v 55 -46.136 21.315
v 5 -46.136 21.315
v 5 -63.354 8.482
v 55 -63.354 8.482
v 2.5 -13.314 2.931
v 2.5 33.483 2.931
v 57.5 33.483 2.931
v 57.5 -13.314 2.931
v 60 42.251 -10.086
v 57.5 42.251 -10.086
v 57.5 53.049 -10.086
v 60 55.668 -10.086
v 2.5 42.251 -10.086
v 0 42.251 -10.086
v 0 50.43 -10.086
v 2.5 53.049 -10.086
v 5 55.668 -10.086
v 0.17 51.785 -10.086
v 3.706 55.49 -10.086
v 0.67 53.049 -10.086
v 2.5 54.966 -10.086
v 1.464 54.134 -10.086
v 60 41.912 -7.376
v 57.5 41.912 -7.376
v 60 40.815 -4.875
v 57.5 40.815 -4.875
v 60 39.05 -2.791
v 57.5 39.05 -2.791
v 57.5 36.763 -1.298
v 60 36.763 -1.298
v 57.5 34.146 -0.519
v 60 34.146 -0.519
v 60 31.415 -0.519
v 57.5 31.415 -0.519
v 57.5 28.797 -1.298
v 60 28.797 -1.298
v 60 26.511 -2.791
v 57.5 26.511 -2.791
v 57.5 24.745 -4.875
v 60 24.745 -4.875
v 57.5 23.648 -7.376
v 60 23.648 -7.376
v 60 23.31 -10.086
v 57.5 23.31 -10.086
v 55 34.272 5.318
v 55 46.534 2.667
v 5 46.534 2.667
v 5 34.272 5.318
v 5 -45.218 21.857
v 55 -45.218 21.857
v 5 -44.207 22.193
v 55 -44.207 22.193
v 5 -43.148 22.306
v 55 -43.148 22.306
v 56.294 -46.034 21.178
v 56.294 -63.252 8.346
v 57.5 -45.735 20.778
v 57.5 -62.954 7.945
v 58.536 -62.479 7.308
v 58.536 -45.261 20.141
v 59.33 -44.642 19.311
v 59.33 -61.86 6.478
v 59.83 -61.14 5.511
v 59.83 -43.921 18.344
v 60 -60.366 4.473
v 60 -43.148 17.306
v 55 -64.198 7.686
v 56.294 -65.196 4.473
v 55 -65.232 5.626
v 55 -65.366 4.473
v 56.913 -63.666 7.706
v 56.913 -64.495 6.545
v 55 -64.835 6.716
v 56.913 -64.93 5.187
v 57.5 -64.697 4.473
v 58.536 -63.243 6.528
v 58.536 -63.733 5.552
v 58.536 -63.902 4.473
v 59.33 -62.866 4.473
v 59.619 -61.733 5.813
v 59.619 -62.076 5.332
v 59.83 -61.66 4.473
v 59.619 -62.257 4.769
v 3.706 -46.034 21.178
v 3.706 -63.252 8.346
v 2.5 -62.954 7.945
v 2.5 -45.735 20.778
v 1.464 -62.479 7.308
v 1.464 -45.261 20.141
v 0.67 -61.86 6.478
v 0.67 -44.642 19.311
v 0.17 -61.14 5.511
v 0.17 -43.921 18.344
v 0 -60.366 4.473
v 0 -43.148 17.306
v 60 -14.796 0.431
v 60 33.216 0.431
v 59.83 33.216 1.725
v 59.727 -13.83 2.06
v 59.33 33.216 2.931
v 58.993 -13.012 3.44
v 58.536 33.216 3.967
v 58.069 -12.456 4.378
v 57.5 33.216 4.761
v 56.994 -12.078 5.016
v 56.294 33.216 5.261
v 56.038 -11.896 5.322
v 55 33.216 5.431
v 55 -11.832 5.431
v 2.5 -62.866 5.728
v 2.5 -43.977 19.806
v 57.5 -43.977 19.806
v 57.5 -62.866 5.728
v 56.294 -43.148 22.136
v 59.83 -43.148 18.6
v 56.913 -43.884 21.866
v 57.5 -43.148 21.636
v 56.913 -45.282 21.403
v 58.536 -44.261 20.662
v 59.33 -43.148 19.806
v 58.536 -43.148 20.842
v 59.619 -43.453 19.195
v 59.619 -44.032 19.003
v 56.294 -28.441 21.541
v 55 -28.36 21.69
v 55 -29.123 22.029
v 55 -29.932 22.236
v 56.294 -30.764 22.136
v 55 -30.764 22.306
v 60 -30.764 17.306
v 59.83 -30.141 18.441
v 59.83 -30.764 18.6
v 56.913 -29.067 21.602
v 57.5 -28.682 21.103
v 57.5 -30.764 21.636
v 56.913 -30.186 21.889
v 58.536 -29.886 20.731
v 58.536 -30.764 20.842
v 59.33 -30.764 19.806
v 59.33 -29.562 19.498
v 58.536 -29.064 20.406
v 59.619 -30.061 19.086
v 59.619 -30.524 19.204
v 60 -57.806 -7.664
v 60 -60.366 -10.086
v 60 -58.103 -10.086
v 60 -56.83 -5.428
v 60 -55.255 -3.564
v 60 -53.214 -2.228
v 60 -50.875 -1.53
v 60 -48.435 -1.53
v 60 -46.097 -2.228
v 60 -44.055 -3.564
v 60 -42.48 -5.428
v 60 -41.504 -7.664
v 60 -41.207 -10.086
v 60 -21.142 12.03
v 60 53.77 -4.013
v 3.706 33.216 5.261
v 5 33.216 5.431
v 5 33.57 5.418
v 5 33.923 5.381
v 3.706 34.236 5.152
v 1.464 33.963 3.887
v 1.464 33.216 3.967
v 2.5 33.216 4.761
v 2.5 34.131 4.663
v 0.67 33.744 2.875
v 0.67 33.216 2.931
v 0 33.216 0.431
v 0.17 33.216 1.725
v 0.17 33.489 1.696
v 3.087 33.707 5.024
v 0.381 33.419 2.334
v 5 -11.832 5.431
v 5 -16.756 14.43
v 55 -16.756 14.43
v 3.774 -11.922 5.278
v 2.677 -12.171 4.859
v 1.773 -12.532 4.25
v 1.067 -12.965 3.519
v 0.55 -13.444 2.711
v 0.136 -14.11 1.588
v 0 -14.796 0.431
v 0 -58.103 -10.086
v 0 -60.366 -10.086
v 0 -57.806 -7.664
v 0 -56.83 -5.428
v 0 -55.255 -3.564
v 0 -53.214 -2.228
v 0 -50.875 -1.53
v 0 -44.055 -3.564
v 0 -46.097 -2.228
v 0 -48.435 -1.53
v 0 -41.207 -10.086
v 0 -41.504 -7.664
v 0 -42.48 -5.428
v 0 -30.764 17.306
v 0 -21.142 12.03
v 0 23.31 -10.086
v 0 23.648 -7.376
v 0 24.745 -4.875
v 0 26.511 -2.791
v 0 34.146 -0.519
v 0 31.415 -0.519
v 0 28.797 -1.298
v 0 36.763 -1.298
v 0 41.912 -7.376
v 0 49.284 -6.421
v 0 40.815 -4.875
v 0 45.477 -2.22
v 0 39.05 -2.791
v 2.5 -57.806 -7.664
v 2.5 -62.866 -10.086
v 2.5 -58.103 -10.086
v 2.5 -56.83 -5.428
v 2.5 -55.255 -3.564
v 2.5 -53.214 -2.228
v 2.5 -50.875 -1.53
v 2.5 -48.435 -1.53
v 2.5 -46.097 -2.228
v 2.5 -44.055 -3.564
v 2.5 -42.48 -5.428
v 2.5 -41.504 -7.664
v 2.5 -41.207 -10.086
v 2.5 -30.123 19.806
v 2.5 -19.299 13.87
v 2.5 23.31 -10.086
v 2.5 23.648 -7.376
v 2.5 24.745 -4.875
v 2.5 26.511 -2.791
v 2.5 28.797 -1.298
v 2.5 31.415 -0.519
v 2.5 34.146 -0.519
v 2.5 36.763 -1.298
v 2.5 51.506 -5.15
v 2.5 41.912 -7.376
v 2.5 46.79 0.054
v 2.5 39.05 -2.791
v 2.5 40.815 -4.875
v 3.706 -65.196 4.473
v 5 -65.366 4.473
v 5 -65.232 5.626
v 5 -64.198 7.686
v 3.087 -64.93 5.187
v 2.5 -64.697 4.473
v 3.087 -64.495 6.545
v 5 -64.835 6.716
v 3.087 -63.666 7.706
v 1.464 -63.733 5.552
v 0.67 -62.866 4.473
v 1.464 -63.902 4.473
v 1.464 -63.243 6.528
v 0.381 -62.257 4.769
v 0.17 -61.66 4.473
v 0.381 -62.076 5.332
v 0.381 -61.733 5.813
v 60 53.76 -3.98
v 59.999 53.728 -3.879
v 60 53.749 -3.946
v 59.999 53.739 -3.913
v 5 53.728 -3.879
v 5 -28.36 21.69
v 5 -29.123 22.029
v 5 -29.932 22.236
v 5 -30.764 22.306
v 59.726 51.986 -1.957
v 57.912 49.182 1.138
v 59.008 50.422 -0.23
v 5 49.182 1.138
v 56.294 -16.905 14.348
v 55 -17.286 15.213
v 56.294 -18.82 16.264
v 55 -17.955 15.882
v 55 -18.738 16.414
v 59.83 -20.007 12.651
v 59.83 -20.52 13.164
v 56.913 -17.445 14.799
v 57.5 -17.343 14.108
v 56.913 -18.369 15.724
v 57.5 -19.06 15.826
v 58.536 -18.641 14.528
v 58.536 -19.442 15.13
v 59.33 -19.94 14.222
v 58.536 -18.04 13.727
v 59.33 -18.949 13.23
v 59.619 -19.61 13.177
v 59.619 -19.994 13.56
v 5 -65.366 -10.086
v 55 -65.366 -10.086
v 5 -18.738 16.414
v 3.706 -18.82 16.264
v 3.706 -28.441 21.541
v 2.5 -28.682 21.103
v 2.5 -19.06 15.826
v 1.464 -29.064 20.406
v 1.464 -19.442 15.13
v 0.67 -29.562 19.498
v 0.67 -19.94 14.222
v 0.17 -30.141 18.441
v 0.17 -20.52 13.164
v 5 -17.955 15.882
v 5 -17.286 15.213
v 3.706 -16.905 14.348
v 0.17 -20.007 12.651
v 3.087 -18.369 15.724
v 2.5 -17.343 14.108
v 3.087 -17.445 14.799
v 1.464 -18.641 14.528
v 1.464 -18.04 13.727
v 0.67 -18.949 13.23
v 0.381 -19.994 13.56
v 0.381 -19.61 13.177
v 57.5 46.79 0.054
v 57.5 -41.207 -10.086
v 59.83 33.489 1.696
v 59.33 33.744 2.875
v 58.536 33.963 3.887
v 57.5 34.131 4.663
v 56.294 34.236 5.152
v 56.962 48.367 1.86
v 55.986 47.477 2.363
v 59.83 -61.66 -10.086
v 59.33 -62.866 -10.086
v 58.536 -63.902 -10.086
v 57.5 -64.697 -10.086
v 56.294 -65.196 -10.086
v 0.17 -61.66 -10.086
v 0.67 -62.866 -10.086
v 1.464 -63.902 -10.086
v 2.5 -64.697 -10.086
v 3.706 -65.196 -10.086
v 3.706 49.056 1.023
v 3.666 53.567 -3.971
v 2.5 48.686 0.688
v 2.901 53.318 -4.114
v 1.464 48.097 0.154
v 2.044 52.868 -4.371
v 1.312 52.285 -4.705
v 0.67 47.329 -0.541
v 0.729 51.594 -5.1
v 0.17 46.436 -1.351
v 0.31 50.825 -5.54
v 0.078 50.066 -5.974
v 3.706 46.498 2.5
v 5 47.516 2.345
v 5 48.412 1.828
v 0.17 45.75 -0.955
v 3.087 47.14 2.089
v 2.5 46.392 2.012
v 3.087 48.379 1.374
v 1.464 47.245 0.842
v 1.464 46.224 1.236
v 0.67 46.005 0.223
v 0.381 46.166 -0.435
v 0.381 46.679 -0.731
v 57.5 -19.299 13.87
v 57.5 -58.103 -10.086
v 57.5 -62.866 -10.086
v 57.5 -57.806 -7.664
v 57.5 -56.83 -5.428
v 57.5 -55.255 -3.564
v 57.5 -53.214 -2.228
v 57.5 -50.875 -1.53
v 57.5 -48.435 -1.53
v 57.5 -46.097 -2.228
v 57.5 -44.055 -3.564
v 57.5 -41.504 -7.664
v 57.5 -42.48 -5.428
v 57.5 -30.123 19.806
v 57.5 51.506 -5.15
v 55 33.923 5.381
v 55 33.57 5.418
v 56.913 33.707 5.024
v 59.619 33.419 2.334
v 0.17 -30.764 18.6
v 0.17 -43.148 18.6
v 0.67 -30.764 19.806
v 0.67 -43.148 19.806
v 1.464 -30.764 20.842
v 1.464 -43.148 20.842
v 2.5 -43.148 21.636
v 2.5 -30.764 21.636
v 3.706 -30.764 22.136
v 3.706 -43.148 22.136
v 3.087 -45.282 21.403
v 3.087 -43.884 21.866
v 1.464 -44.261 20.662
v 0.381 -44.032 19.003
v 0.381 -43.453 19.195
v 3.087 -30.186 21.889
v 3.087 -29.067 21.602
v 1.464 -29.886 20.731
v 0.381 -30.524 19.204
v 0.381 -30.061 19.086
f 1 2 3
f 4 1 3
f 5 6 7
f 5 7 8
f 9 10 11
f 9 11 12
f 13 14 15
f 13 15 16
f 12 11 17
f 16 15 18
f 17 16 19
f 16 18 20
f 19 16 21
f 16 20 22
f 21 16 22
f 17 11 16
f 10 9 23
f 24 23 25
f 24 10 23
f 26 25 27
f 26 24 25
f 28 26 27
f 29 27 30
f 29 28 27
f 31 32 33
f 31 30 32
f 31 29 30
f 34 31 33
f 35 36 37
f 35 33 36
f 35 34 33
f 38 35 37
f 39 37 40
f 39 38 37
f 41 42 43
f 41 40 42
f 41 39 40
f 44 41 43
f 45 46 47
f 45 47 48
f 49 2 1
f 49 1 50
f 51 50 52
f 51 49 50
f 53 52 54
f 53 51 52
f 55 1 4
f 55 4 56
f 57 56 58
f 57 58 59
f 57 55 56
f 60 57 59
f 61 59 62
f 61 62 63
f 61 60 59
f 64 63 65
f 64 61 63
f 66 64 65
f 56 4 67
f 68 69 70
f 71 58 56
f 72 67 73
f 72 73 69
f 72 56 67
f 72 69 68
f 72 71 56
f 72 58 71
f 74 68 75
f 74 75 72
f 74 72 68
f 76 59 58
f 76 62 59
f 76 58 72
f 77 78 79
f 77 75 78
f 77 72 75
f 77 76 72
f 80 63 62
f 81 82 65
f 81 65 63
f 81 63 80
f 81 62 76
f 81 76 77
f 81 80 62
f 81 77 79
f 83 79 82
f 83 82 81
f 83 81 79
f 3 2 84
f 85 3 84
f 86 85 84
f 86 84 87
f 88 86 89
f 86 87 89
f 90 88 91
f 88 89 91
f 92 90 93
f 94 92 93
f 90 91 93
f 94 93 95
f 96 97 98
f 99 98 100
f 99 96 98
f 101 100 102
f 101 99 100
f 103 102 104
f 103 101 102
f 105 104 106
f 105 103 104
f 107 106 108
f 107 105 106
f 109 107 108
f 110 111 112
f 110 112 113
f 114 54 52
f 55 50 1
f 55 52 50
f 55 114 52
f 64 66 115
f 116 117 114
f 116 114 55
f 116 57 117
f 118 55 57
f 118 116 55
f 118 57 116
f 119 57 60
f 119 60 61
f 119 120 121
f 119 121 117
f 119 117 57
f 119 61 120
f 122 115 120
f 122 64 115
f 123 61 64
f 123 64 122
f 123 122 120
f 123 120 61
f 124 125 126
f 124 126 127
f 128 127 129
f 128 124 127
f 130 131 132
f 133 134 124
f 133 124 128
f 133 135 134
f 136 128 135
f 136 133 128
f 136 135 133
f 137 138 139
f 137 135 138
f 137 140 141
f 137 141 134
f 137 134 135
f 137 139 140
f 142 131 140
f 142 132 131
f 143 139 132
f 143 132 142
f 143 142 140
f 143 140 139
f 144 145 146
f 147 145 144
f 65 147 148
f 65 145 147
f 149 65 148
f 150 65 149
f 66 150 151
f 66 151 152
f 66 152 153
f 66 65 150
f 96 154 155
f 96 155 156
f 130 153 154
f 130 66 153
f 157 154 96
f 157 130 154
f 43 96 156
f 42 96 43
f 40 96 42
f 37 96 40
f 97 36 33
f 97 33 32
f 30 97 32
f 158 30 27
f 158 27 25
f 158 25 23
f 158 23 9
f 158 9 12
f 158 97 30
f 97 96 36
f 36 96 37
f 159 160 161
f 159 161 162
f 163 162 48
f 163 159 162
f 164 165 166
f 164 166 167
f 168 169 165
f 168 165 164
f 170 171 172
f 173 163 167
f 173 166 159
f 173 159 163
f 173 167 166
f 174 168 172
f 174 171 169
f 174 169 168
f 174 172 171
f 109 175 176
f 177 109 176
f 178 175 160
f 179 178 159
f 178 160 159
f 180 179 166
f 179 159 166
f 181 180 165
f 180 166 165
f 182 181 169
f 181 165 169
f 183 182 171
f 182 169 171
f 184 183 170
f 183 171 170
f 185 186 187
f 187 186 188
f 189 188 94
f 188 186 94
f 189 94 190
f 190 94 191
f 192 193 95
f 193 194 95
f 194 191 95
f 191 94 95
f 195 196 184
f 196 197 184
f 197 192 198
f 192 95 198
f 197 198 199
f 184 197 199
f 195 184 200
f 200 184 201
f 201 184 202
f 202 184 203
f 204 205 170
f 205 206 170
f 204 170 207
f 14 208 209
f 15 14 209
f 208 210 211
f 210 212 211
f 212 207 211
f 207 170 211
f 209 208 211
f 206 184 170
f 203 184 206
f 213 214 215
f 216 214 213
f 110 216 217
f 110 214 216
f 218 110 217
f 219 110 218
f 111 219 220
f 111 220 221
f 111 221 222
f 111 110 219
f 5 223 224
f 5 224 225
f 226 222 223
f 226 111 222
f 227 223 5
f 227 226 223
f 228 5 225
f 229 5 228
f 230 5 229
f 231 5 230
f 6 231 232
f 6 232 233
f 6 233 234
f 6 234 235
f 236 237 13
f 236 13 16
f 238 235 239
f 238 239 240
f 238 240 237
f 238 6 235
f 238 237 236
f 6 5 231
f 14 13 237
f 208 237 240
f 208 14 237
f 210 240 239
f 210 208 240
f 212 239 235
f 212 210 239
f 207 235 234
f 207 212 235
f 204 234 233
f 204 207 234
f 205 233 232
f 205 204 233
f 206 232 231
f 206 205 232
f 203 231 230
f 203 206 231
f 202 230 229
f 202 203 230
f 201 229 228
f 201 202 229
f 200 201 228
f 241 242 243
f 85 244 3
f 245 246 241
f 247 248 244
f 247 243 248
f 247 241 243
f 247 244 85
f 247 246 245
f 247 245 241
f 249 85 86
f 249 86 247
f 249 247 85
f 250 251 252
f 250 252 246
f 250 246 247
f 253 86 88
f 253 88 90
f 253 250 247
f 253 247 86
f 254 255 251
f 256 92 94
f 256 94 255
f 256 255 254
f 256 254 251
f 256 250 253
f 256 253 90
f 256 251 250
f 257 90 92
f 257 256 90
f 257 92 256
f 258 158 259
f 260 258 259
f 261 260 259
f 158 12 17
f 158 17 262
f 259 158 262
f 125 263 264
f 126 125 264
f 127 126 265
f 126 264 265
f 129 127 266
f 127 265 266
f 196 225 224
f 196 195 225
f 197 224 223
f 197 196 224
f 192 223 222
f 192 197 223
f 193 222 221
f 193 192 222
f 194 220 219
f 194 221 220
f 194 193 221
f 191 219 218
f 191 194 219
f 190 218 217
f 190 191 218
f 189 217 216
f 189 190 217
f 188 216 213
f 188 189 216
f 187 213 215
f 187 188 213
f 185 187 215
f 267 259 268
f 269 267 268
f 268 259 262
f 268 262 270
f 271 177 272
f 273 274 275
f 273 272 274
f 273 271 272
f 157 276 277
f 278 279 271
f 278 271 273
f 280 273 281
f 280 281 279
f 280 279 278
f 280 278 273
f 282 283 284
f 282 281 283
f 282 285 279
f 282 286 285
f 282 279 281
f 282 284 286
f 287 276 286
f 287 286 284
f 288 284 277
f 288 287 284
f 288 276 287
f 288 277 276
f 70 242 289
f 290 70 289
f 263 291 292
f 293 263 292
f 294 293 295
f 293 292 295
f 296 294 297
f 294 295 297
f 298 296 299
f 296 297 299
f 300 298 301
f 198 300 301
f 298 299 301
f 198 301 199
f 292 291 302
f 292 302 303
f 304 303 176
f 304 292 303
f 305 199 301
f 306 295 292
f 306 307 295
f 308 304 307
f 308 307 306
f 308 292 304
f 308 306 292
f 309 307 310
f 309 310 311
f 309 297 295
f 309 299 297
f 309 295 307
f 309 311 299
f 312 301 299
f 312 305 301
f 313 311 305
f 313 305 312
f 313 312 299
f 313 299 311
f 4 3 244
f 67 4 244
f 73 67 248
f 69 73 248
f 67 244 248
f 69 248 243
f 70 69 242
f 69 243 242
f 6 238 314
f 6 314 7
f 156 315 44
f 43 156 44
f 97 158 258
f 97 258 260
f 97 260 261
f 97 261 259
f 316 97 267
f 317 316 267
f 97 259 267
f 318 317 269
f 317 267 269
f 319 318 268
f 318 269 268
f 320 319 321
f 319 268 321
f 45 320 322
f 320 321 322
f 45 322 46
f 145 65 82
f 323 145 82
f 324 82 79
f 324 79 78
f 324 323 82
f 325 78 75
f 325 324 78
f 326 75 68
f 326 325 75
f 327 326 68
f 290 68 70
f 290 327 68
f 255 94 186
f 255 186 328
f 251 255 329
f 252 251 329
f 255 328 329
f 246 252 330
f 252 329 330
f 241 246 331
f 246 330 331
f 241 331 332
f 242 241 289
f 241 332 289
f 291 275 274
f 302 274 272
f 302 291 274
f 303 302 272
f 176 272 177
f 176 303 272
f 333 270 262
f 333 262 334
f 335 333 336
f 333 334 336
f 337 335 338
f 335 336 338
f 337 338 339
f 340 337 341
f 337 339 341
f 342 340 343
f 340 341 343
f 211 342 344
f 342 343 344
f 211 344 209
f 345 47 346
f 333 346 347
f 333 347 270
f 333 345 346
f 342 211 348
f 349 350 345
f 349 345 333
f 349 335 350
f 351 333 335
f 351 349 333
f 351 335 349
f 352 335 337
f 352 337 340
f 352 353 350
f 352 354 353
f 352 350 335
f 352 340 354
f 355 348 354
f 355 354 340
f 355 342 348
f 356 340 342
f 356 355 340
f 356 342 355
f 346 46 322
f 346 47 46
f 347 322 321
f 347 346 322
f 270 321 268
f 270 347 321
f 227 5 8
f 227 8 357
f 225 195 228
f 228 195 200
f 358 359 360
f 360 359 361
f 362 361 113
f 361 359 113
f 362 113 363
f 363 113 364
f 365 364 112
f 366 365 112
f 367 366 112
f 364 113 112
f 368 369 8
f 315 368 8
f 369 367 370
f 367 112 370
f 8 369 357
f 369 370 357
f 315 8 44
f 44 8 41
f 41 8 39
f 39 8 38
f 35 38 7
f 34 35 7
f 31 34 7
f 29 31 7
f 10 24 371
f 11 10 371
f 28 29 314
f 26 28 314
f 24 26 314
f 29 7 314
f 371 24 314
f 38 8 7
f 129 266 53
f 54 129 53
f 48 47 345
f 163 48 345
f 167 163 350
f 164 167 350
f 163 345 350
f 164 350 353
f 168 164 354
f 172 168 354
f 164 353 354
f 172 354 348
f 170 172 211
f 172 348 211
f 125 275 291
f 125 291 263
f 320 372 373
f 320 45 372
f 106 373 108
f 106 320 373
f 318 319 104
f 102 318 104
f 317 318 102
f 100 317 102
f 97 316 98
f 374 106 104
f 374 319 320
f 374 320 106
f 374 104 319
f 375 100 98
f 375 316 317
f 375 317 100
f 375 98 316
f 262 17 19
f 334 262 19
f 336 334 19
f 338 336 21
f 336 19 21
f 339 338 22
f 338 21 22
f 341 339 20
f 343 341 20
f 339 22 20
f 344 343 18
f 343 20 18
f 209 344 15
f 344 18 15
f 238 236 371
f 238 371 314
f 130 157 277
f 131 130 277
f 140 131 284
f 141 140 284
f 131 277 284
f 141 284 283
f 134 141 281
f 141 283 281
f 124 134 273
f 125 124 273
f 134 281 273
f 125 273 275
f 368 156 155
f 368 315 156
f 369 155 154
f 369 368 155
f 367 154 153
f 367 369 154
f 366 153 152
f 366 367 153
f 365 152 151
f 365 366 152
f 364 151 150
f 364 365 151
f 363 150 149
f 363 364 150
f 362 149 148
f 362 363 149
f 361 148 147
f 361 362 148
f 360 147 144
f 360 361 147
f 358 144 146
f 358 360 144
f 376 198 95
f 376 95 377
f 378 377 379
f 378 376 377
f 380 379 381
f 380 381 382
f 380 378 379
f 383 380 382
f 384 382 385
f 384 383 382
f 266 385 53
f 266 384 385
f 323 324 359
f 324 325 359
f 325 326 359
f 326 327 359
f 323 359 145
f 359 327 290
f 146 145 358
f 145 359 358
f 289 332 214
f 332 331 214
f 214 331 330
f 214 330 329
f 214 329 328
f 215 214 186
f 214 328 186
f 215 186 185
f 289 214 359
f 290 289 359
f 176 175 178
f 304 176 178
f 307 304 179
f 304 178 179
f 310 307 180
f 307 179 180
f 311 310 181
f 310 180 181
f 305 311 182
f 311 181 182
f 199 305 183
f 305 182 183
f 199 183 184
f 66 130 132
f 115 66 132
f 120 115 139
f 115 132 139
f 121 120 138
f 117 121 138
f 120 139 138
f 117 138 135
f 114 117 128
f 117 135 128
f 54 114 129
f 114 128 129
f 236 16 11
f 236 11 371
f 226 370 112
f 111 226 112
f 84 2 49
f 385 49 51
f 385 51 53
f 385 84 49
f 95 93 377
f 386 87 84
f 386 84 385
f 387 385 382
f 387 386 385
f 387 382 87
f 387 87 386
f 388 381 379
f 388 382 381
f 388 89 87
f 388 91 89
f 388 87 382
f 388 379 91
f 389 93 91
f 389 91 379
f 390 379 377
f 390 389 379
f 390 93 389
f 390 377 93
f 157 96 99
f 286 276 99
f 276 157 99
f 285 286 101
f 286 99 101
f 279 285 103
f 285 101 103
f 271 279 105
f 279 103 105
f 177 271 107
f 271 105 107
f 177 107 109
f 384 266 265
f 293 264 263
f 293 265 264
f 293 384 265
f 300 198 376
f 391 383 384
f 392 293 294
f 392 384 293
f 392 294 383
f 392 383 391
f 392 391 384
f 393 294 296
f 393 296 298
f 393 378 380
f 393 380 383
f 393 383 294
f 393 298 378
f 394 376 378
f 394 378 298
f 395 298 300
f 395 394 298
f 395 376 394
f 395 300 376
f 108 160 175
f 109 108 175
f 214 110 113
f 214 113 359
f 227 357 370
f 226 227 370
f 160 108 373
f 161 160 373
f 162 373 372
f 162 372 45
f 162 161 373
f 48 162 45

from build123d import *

# Parameters (mm, degrees)
F1_DEPTH      = 60
F2_T          = -2.5
F3_T1_DEPTH   = 31.5029107171
F3_T3_DEPTH   = 19.2704775269
F3_T5_DEPTH   = 59.0151251094
F3_T7_DEPTH   = 50
F3_T9_DEPTH   = 12.544705842
F3_T11_DEPTH  = 26.6507558857
F3_T13_DEPTH  = 10.9735782615
F3_T15_DEPTH  = 12.384029335
F3_T17_DEPTH  = 21.4746284083
F3_T19_DEPTH  = 27.0595039158
F3_T24_DEPTH  = 5
F3_T30_DEPTH  = 5
F3_T36_DEPTH  = 5
F3_T42_DEPTH  = 5
F3_T48_DEPTH  = 5
F3_T54_DEPTH  = 5
F3_T60_DEPTH  = 5
F3_T66_DEPTH  = 5
F3_T72_DEPTH  = 5
F3_T78_DEPTH  = 5
F3_T84_DEPTH  = 5
F3_T90_DEPTH  = 57.5475311177
F3_T95_DEPTH  = 22.7575976563
F3_T100_DEPTH = 57.5475311177
F3_T105_DEPTH = 22.7575976563
F3_T111_DEPTH = 22.7575976563
F3_T115_DEPTH = 57.5475311177
F3_T122_DEPTH = 57.5475311177
F3_T126_DEPTH = 22.7575976563
F4_R          = 8.968677233
F4_R_2        = 8.5168287605
F5_DEPTH      = 60
F6_R          = 9.472590991
F6_R_2        = 8.4503132789
F7_DEPTH      = 65.4


# Not quite as in the source:
# - a fillet or chamfer that OpenCascade refuses, or shapes differently, is made with other operations: its cross-section is extruded or revolved along the edge and cut away or added


with BuildPart() as f1:
    # F0 (on Right) → F1 (new body)
    with BuildSketch(Plane.YZ):
        Polygon((-44.8060370982, 22.3060343415), (-65.3663799167, 6.9827586412), (-65.3663799167, -10.0862076506), (55.6681081653, -10.0862076506), (53.7284500897, -3.8793103304), (48.1034480035, 2.3275862914), (33.7500013411, 5.4310346022), (20.5603465438, 5.4310346022), (4.4612074271, 5.4310346022), (-11.8318963796, 5.4310346022), (-17.4568966031, 15.7112069428), (-29.4827595353, 22.3060343415), align=None)
    extrude(amount=F1_DEPTH)

    # F2
    f2_openings = [f1.faces().sort_by_distance(p)[0] for p in [
        (30, -4.849136, -10.086208),
    ]]
    offset(amount=F2_T, openings=f2_openings, kind=Kind.INTERSECTION)

    # F3: fillet of radius 5 on 22 edges, made by hand

    # F3_s2 → F3_t1 (cut)
    with BuildSketch(Plane(origin=(0, 11.5526545627, -36.9684438457), x_dir=(1, 0, 0), z_dir=(0, -0.2982753662, 0.9544798614))):
        with BuildLine():
            ThreePointArc((5, 50.125620888), (1.4644660941, 48.661154794), (0, 45.125620888))
            Line((0, 45.125620888), (0, 50.125620888))
            Line((0, 50.125620888), (5, 50.125620888))
        make_face()
    extrude(amount=F3_T1_DEPTH, mode=Mode.SUBTRACT)

    # F3_s4 → F3_t3 (cut)
    with BuildSketch(Plane(origin=(0, 34.5525169769, -38.1269015747), x_dir=(1, 0, 0), z_dir=(0, -0.6715195573, 0.7409868313))):
        with BuildLine():
            ThreePointArc((5, 37.2070412259), (1.4644660941, 35.7425751318), (0, 32.2070412259))
            Line((0, 32.2070412259), (0, 37.2070412259))
            Line((0, 37.2070412259), (5, 37.2070412259))
        make_face()
    extrude(amount=F3_T3_DEPTH, mode=Mode.SUBTRACT)

    # F3_s6 → F3_t5 (cut)
    with BuildSketch(Plane.YZ.offset(5)):
        with BuildLine():
            ThreePointArc((46.533671949, 2.6669973721), (47.9776130651, 2.1097041201), (49.1819420179, 1.1375243586))
            Line((49.1819420179, 1.1375243586), (48.1034480035, 2.3275862914))
            Line((48.1034480035, 2.3275862914), (46.533671949, 2.6669973721))
        make_face()
    extrude(amount=F3_T5_DEPTH, mode=Mode.SUBTRACT)

    # F3_s8 → F3_t7 (cut)
    with BuildSketch(Plane.YZ.offset(5)):
        with BuildLine():
            ThreePointArc((33.2156347381, 5.4310346022), (33.7469754945, 5.4027221427), (34.2722988256, 5.3181054024))
            Line((34.2722988256, 5.3181054024), (33.7500013411, 5.4310346022))
            Line((33.7500013411, 5.4310346022), (33.2156347381, 5.4310346022))
        make_face()
        with BuildLine():
            ThreePointArc((-46.1356544501, 21.3150930211), (-44.7217318567, 22.051837403), (-43.147770834, 22.3060343415))
            Line((-43.147770834, 22.3060343415), (-44.8060370982, 22.3060343415))
            Line((-44.8060370982, 22.3060343415), (-46.1356544501, 21.3150930211))
        make_face()
        with BuildLine():
            ThreePointArc((-63.3542635327, 8.4823549449), (-64.8351279561, 6.7161272798), (-65.3663799167, 4.4732962652))
            Line((-65.3663799167, 4.4732962652), (-65.3663799167, 6.9827586412))
            Line((-65.3663799167, 6.9827586412), (-63.3542635327, 8.4823549449))
        make_face()
        with BuildLine():
            ThreePointArc((-28.3595786282, 21.6900964864), (-29.5228367333, 22.1496027948), (-30.763741499, 22.3060343415))
            Line((-30.763741499, 22.3060343415), (-29.4827595353, 22.3060343415))
            Line((-29.4827595353, 22.3060343415), (-28.3595786282, 21.6900964864))
        make_face()
        with BuildLine():
            ThreePointArc((-18.7378088181, 16.4136426032), (-17.604783068, 15.5634588744), (-16.7556605267, 14.4296376218))
            Line((-16.7556605267, 14.4296376218), (-17.4568966031, 15.7112069428))
            Line((-17.4568966031, 15.7112069428), (-18.7378088181, 16.4136426032))
        make_face()
    extrude(amount=F3_T7_DEPTH, mode=Mode.SUBTRACT)

    # F3_s10 → F3_t9 (cut)
    with BuildSketch(Plane(origin=(0, 43.9045114329, -9.492868511), x_dir=(1, 0, 0), z_dir=(0, -0.97741416, 0.2113328175))):
        with BuildLine():
            ThreePointArc((5, 12.4408529979), (1.4644660941, 10.9763869038), (0, 7.4408529979))
            Line((0, 7.4408529979), (0, 12.4408529979))
            Line((0, 12.4408529979), (5, 12.4408529979))
        make_face()
    extrude(amount=F3_T9_DEPTH, mode=Mode.SUBTRACT)

    # F3_s12 → F3_t11 (cut)
    with BuildSketch(Plane(origin=(0, 57.6919644879, -12.4739398105), x_dir=(1, 0, 0), z_dir=(0, -0.97741416, 0.2113328175))):
        with BuildLine():
            ThreePointArc((60, 7.4408529979), (58.5355339059, 10.9763869038), (55, 12.4408529979))
            Line((55, 12.4408529979), (60, 12.4408529979))
            Line((60, 12.4408529979), (60, 7.4408529979))
        make_face()
    extrude(amount=F3_T11_DEPTH, mode=Mode.SUBTRACT)

    # F3_s14 → F3_t13 (cut)
    with BuildSketch(Plane(origin=(0, -21.3256194356, 11.6946933572), x_dir=(1, 0, 0), z_dir=(0, -0.876812429, 0.4808325742))):
        with BuildLine():
            ThreePointArc((5, 5.3819369913), (1.4644660941, 3.9174708973), (0, 0.3819369913))
            Line((0, 0.3819369913), (0, 5.3819369913))
            Line((0, 5.3819369913), (5, 5.3819369913))
        make_face()
        with BuildLine():
            ThreePointArc((60, 0.3819369913), (58.5355339059, 3.9174708973), (55, 5.3819369913))
            Line((55, 5.3819369913), (60, 5.3819369913))
            Line((60, 5.3819369913), (60, 0.3819369913))
        make_face()
    extrude(amount=F3_T13_DEPTH, mode=Mode.SUBTRACT)

    # F3_s16 → F3_t15 (cut)
    with BuildSketch(Plane.XZ.offset(30.763741499)):
        with BuildLine():
            ThreePointArc((0, 17.3060343415), (1.4644660941, 20.8415682474), (5, 22.3060343415))
            Line((5, 22.3060343415), (0, 22.3060343415))
            Line((0, 22.3060343415), (0, 17.3060343415))
        make_face()
        with BuildLine():
            ThreePointArc((60, 17.3060343415), (58.5355339059, 20.8415682474), (55, 22.3060343415))
            Line((55, 22.3060343415), (60, 22.3060343415))
            Line((60, 22.3060343415), (60, 17.3060343415))
        make_face()
    extrude(amount=F3_T15_DEPTH, mode=Mode.SUBTRACT)

    # F3_s18 → F3_t17 (cut)
    with BuildSketch(Plane(origin=(0, -19.4477077147, -14.4940475789), x_dir=(1, 0, 0), z_dir=(0, -0.8018117359, -0.5975767232))):
        with BuildLine():
            ThreePointArc((5, 44.660284946), (1.4644660941, 43.195818852), (0, 39.660284946))
            Line((0, 39.660284946), (0, 44.660284946))
            Line((0, 44.660284946), (5, 44.660284946))
        make_face()
        with BuildLine():
            ThreePointArc((55, 44.660284946), (58.5355339059, 43.195818852), (60, 39.660284946))
            Line((60, 39.660284946), (60, 44.660284946))
            Line((60, 44.660284946), (55, 44.660284946))
        make_face()
    extrude(amount=F3_T17_DEPTH, mode=Mode.SUBTRACT)

    # F3_s20 → F3_t19 (cut)
    with BuildSketch(Plane.XY.offset(-22.5862076506)):
        with BuildLine():
            ThreePointArc((0, -60.3663799167), (1.4644660941, -63.9019138226), (5, -65.3663799167))
            Line((5, -65.3663799167), (0, -65.3663799167))
            Line((0, -65.3663799167), (0, -60.3663799167))
        make_face()
        with BuildLine():
            ThreePointArc((60, -60.3663799167), (58.5355339059, -63.9019138226), (55, -65.3663799167))
            Line((55, -65.3663799167), (60, -65.3663799167))
            Line((60, -65.3663799167), (60, -60.3663799167))
        make_face()
    extrude(amount=F3_T19_DEPTH, mode=Mode.SUBTRACT)


with BuildPart() as f3_tool22:
    # F3_s23 → F3_t24 (new body)
    with BuildSketch(Plane.YZ.offset(5)):
        Polygon((45.4770078615, -2.2200734281), (46.533671949, 2.6669973721), (48.1034480035, 2.3275862914), (49.1819420179, 1.1375243586), align=None)
    extrude(amount=-F3_T24_DEPTH)

    # F3_s25 → F3_t26 (revolve, cut)
    with BuildSketch(Plane(origin=(5, 45.4770078615, -2.2200734281), x_dir=(0, -0.5001210407, -0.8659555096), z_dir=(0, 0.8659555096, -0.5001210407))):
        with BuildLine():
            ThreePointArc((0, -5), (5, 0), (0, 5))
            Line((0, 5), (0, -5))
        make_face()
    revolve(axis=Axis((5, 45.4770078615, -2.2200734281), (-1, 0, 0)), mode=Mode.SUBTRACT)


with BuildPart() as f1_1:
    add(f1.part)

    # F3_t21: cut F3_tool22
    add(f3_tool22.part, mode=Mode.SUBTRACT)


with BuildPart() as f3_tool28:
    # F3_s29 → F3_t30 (new body)
    with BuildSketch(Plane.YZ.offset(5)):
        Polygon((33.2156347381, 0.4310346022), (33.2156347381, 5.4310346022), (33.7500013411, 5.4310346022), (34.2722988256, 5.3181054024), align=None)
    extrude(amount=-F3_T30_DEPTH)

    # F3_s31 → F3_t32 (revolve, cut)
    with BuildSketch(Plane(origin=(5, 33.2156347381, 0.4310346022), x_dir=(0, -0.1062681513, -0.9943375081), z_dir=(0, 0.9943375081, -0.1062681513))):
        with BuildLine():
            ThreePointArc((0, -5), (5, 0), (0, 5))
            Line((0, 5), (0, -5))
        make_face()
    revolve(axis=Axis((5, 33.2156347381, 0.4310346022), (-1, 0, 0)), mode=Mode.SUBTRACT)


with BuildPart() as f1_2:
    add(f1_1.part)

    # F3_t27: cut F3_tool28
    add(f3_tool28.part, mode=Mode.SUBTRACT)


with BuildPart() as f3_tool34:
    # F3_s35 → F3_t36 (new body)
    with BuildSketch(Plane.YZ.offset(55)):
        Polygon((33.2156347381, 0.4310346022), (33.2156347381, 5.4310346022), (33.7500013411, 5.4310346022), (34.2722988256, 5.3181054024), align=None)
    extrude(amount=F3_T36_DEPTH)

    # F3_s37 → F3_t38 (revolve, cut)
    with BuildSketch(Plane(origin=(55, 33.2156347381, 0.4310346022), x_dir=(0, -0.1062681513, -0.9943375081), z_dir=(0, -0.9943375081, 0.1062681513))):
        with BuildLine():
            ThreePointArc((0, -5), (5, 0), (0, 5))
            Line((0, 5), (0, -5))
        make_face()
    revolve(axis=Axis((55, 33.2156347381, 0.4310346022), (1, 0, 0)), mode=Mode.SUBTRACT)


with BuildPart() as f1_3:
    add(f1_2.part)

    # F3_t33: cut F3_tool34
    add(f3_tool34.part, mode=Mode.SUBTRACT)


with BuildPart() as f3_tool40:
    # F3_s41 → F3_t42 (new body)
    with BuildSketch(Plane.YZ.offset(5)):
        Polygon((-21.1419716889, 12.0295804583), (-18.7378088181, 16.4136426032), (-17.4568966031, 15.7112069428), (-16.7556605267, 14.4296376218), align=None)
    extrude(amount=-F3_T42_DEPTH)

    # F3_s43 → F3_t44 (revolve, cut)
    with BuildSketch(Plane(origin=(5, -21.1419716889, 12.0295804583), x_dir=(0, -0.7074377242, -0.7067756832), z_dir=(0, 0.7067756832, -0.7074377242))):
        with BuildLine():
            ThreePointArc((0, -5), (5, 0), (0, 5))
            Line((0, 5), (0, -5))
        make_face()
    revolve(axis=Axis((5, -21.1419716889, 12.0295804583), (-1, 0, 0)), mode=Mode.SUBTRACT)


with BuildPart() as f1_4:
    add(f1_3.part)

    # F3_t39: cut F3_tool40
    add(f3_tool40.part, mode=Mode.SUBTRACT)


with BuildPart() as f3_tool46:
    # F3_s47 → F3_t48 (new body)
    with BuildSketch(Plane.YZ.offset(5)):
        Polygon((-30.763741499, 17.3060343415), (-28.3595786282, 21.6900964864), (-29.4827595353, 22.3060343415), (-30.763741499, 22.3060343415), align=None)
    extrude(amount=-F3_T48_DEPTH)

    # F3_s49 → F3_t50 (revolve, cut)
    with BuildSketch(Plane(origin=(5, -30.763741499, 17.3060343415), x_dir=(0, -0.2481809531, -0.9687136907), z_dir=(0, 0.9687136907, -0.2481809531))):
        with BuildLine():
            ThreePointArc((0, -5), (5, 0), (0, 5))
            Line((0, 5), (0, -5))
        make_face()
    revolve(axis=Axis((5, -30.763741499, 17.3060343415), (-1, 0, 0)), mode=Mode.SUBTRACT)


with BuildPart() as f1_5:
    add(f1_4.part)

    # F3_t45: cut F3_tool46
    add(f3_tool46.part, mode=Mode.SUBTRACT)


with BuildPart() as f3_tool52:
    # F3_s53 → F3_t54 (new body)
    with BuildSketch(Plane.YZ.offset(5)):
        Polygon((-43.147770834, 17.3060343415), (-46.1356544501, 21.3150930211), (-44.8060370982, 22.3060343415), (-43.147770834, 22.3060343415), align=None)
    extrude(amount=-F3_T54_DEPTH)

    # F3_s55 → F3_t56 (revolve, cut)
    with BuildSketch(Plane(origin=(5, -43.147770834, 17.3060343415), x_dir=(0, 0.3147922045, -0.9491606123), z_dir=(0, 0.9491606123, 0.3147922045))):
        with BuildLine():
            ThreePointArc((0, -5), (5, 0), (0, 5))
            Line((0, 5), (0, -5))
        make_face()
    revolve(axis=Axis((5, -43.147770834, 17.3060343415), (-1, 0, 0)), mode=Mode.SUBTRACT)


with BuildPart() as f1_6:
    add(f1_5.part)

    # F3_t51: cut F3_tool52
    add(f3_tool52.part, mode=Mode.SUBTRACT)


with BuildPart() as f3_tool58:
    # F3_s59 → F3_t60 (new body)
    with BuildSketch(Plane.YZ.offset(5)):
        Polygon((-60.3663799167, 4.4732962652), (-65.3663799167, 4.4732962652), (-65.3663799167, 6.9827586412), (-63.3542635327, 8.4823549449), align=None)
    extrude(amount=-F3_T60_DEPTH)

    # F3_s61 → F3_t62 (revolve, cut)
    with BuildSketch(Plane(origin=(5, -60.3663799167, 4.4732962652), x_dir=(0, 0.8937496079, -0.4485662029), z_dir=(0, 0.4485662029, 0.8937496079))):
        with BuildLine():
            ThreePointArc((0, -5), (5, 0), (0, 5))
            Line((0, 5), (0, -5))
        make_face()
    revolve(axis=Axis((5, -60.3663799167, 4.4732962652), (-1, 0, 0)), mode=Mode.SUBTRACT)


with BuildPart() as f1_7:
    add(f1_6.part)

    # F3_t57: cut F3_tool58
    add(f3_tool58.part, mode=Mode.SUBTRACT)


with BuildPart() as f3_tool64:
    # F3_s65 → F3_t66 (new body)
    with BuildSketch(Plane.YZ.offset(55)):
        Polygon((-21.1419716889, 12.0295804583), (-18.7378088181, 16.4136426032), (-17.4568966031, 15.7112069428), (-16.7556605267, 14.4296376218), align=None)
    extrude(amount=F3_T66_DEPTH)

    # F3_s67 → F3_t68 (revolve, cut)
    with BuildSketch(Plane(origin=(55, -21.1419716889, 12.0295804583), x_dir=(0, -0.7074377242, -0.7067756832), z_dir=(0, -0.7067756832, 0.7074377242))):
        with BuildLine():
            ThreePointArc((0, -5), (5, 0), (0, 5))
            Line((0, 5), (0, -5))
        make_face()
    revolve(axis=Axis((55, -21.1419716889, 12.0295804583), (1, 0, 0)), mode=Mode.SUBTRACT)


with BuildPart() as f1_8:
    add(f1_7.part)

    # F3_t63: cut F3_tool64
    add(f3_tool64.part, mode=Mode.SUBTRACT)


with BuildPart() as f3_tool70:
    # F3_s71 → F3_t72 (new body)
    with BuildSketch(Plane.YZ.offset(55)):
        Polygon((-30.763741499, 17.3060343415), (-28.3595786282, 21.6900964864), (-29.4827595353, 22.3060343415), (-30.763741499, 22.3060343415), align=None)
    extrude(amount=F3_T72_DEPTH)

    # F3_s73 → F3_t74 (revolve, cut)
    with BuildSketch(Plane(origin=(55, -30.763741499, 17.3060343415), x_dir=(0, -0.2481809531, -0.9687136907), z_dir=(0, -0.9687136907, 0.2481809531))):
        with BuildLine():
            ThreePointArc((0, -5), (5, 0), (0, 5))
            Line((0, 5), (0, -5))
        make_face()
    revolve(axis=Axis((55, -30.763741499, 17.3060343415), (1, 0, 0)), mode=Mode.SUBTRACT)


with BuildPart() as f1_9:
    add(f1_8.part)

    # F3_t69: cut F3_tool70
    add(f3_tool70.part, mode=Mode.SUBTRACT)


with BuildPart() as f3_tool76:
    # F3_s77 → F3_t78 (new body)
    with BuildSketch(Plane.YZ.offset(55)):
        Polygon((-43.147770834, 17.3060343415), (-43.147770834, 22.3060343415), (-44.8060370982, 22.3060343415), (-46.1356544501, 21.3150930211), align=None)
    extrude(amount=F3_T78_DEPTH)

    # F3_s79 → F3_t80 (revolve, cut)
    with BuildSketch(Plane(origin=(55, -43.147770834, 17.3060343415), x_dir=(0, 0.3147922045, -0.9491606123), z_dir=(0, -0.9491606123, -0.3147922045))):
        with BuildLine():
            ThreePointArc((0, -5), (5, 0), (0, 5))
            Line((0, 5), (0, -5))
        make_face()
    revolve(axis=Axis((55, -43.147770834, 17.3060343415), (1, 0, 0)), mode=Mode.SUBTRACT)


with BuildPart() as f1_10:
    add(f1_9.part)

    # F3_t75: cut F3_tool76
    add(f3_tool76.part, mode=Mode.SUBTRACT)


with BuildPart() as f3_tool82:
    # F3_s83 → F3_t84 (new body)
    with BuildSketch(Plane.YZ.offset(55)):
        Polygon((-60.3663799167, 4.4732962652), (-65.3663799167, 4.4732962652), (-65.3663799167, 6.9827586412), (-63.3542635327, 8.4823549449), align=None)
    extrude(amount=F3_T84_DEPTH)

    # F3_s85 → F3_t86 (revolve, cut)
    with BuildSketch(Plane(origin=(55, -60.3663799167, 4.4732962652), x_dir=(0, 0.8937496079, -0.4485662029), z_dir=(0, -0.4485662029, -0.8937496079))):
        with BuildLine():
            ThreePointArc((0, -5), (5, 0), (0, 5))
            Line((0, 5), (0, -5))
        make_face()
    revolve(axis=Axis((55, -60.3663799167, 4.4732962652), (1, 0, 0)), mode=Mode.SUBTRACT)


with BuildPart() as f1_11:
    add(f1_10.part)

    # F3_t81: cut F3_tool82
    add(f3_tool82.part, mode=Mode.SUBTRACT)


with BuildPart() as f3_tool88:
    # F3_s89 → F3_t90 (new body)
    with BuildSketch(Plane.XZ.offset(-33.2156347381)):
        with BuildLine():
            ThreePointArc((5, 5.4310346022), (1.4644660941, 3.9665685082), (0, 0.4310346022))
            Line((0, 0.4310346022), (0, 5.4310346022))
            Line((0, 5.4310346022), (5, 5.4310346022))
        make_face()
    extrude(amount=F3_T90_DEPTH)

    split(bisect_by=Plane(origin=(0, -6.818711183, -3.7309930863), x_dir=(1, 0, 0), z_dir=(0, 0.8772622324, 0.4800114327)), keep=Keep.TOP)


with BuildPart() as f1_12:
    add(f1_11.part)

    # F3_t87: cut F3_tool88
    add(f3_tool88.part, mode=Mode.SUBTRACT)


with BuildPart() as f3_tool93:
    # F3_s94 → F3_t95 (new body)
    with BuildSketch(Plane(origin=(0, 0.9869577122, -1.8037502171), x_dir=(1, 0, 0), z_dir=(0, -0.4800114327, 0.8772622324))):
        with BuildLine():
            ThreePointArc((5, -7.7727171316), (1.4644660941, -9.2371832257), (0, -12.7727171316))
            Line((0, -12.7727171316), (0, -7.7727171316))
            Line((0, -7.7727171316), (5, -7.7727171316))
        make_face()
    extrude(amount=F3_T95_DEPTH)

    split(bisect_by=Plane.XY.offset(5.4310346022), keep=Keep.TOP)


with BuildPart() as f1_13:
    add(f1_12.part)

    # F3_t92: cut F3_tool93
    add(f3_tool93.part, mode=Mode.SUBTRACT)


with BuildPart() as f3_tool98:
    # F3_s99 → F3_t100 (new body)
    with BuildSketch(Plane.XZ.offset(24.3318963796)):
        with BuildLine():
            ThreePointArc((60, 0.4310346022), (58.5355339059, 3.9665685082), (55, 5.4310346022))
            Line((55, 5.4310346022), (60, 5.4310346022))
            Line((60, 5.4310346022), (60, 0.4310346022))
        make_face()
    extrude(amount=-F3_T100_DEPTH)

    split(bisect_by=Plane(origin=(0, -6.818711183, -3.7309930863), x_dir=(1, 0, 0), z_dir=(0, 0.8772622324, 0.4800114327)), keep=Keep.TOP)


with BuildPart() as f1_14:
    add(f1_13.part)

    # F3_t97: cut F3_tool98
    add(f3_tool98.part, mode=Mode.SUBTRACT)


with BuildPart() as f3_tool103:
    # F3_s104 → F3_t105 (new body)
    with BuildSketch(Plane(origin=(0, 0.9869577122, -1.8037502171), x_dir=(1, 0, 0), z_dir=(0, -0.4800114327, 0.8772622324))):
        with BuildLine():
            ThreePointArc((60, -12.7727171316), (58.5355339059, -9.2371832257), (55, -7.7727171316))
            Line((55, -7.7727171316), (60, -7.7727171316))
            Line((60, -7.7727171316), (60, -12.7727171316))
        make_face()
    extrude(amount=F3_T105_DEPTH)

    split(bisect_by=Plane.XY.offset(5.4310346022), keep=Keep.TOP)


with BuildPart() as f1_15:
    add(f1_14.part)

    # F3_t102: cut F3_tool103
    add(f3_tool103.part, mode=Mode.SUBTRACT)


with BuildPart() as f3_tool109:
    # F3_s110 → F3_t111 (new body)
    with BuildSketch(Plane(origin=(0, 0.9869577122, -1.8037502171), x_dir=(1, 0, 0), z_dir=(0, -0.4800114327, 0.8772622324))):
        with BuildLine():
            ThreePointArc((5, -7.7727171316), (1.4644660941, -9.2371832257), (0, -12.7727171316))
            Line((0, -12.7727171316), (0, -7.7727171316))
            Line((0, -7.7727171316), (5, -7.7727171316))
        make_face()
    extrude(amount=F3_T111_DEPTH)

    split(bisect_by=Plane.XY.offset(5.4310346022), keep=Keep.BOTTOM)


with BuildPart() as f3_tool113:
    # F3_s114 → F3_t115 (new body)
    with BuildSketch(Plane.XZ.offset(-33.2156347381)):
        with BuildLine():
            ThreePointArc((5, 5.4310346022), (1.4644660941, 3.9665685082), (0, 0.4310346022))
            Line((0, 0.4310346022), (0, 5.4310346022))
            Line((0, 5.4310346022), (5, 5.4310346022))
        make_face()
    extrude(amount=F3_T115_DEPTH)

    split(bisect_by=Plane(origin=(0, -6.818711183, -3.7309930863), x_dir=(1, 0, 0), z_dir=(0, -0.8772622324, -0.4800114327)), keep=Keep.TOP)


with BuildPart() as f3_tool109_1:
    add(f3_tool109.part)

    # F3_t117: intersect F3_tool113
    add(f3_tool113.part, mode=Mode.INTERSECT)


with BuildPart() as f1_16:
    add(f1_15.part)

    # F3_t107: cut F3_tool109
    add(f3_tool109_1.part, mode=Mode.SUBTRACT)


with BuildPart() as f3_tool120:
    # F3_s121 → F3_t122 (new body)
    with BuildSketch(Plane.XZ.offset(24.3318963796)):
        with BuildLine():
            ThreePointArc((60, 0.4310346022), (58.5355339059, 3.9665685082), (55, 5.4310346022))
            Line((55, 5.4310346022), (60, 5.4310346022))
            Line((60, 5.4310346022), (60, 0.4310346022))
        make_face()
    extrude(amount=-F3_T122_DEPTH)

    split(bisect_by=Plane(origin=(0, -6.818711183, -3.7309930863), x_dir=(1, 0, 0), z_dir=(0, -0.8772622324, -0.4800114327)), keep=Keep.TOP)


with BuildPart() as f3_tool124:
    # F3_s125 → F3_t126 (new body)
    with BuildSketch(Plane(origin=(0, 0.9869577122, -1.8037502171), x_dir=(1, 0, 0), z_dir=(0, -0.4800114327, 0.8772622324))):
        with BuildLine():
            ThreePointArc((60, -12.7727171316), (58.5355339059, -9.2371832257), (55, -7.7727171316))
            Line((55, -7.7727171316), (60, -7.7727171316))
            Line((60, -7.7727171316), (60, -12.7727171316))
        make_face()
    extrude(amount=F3_T126_DEPTH)

    split(bisect_by=Plane.XY.offset(5.4310346022), keep=Keep.BOTTOM)


with BuildPart() as f3_tool120_1:
    add(f3_tool120.part)

    # F3_t128: intersect F3_tool124
    add(f3_tool124.part, mode=Mode.INTERSECT)


with BuildPart() as f1_17:
    add(f1_16.part)

    # F3_t118: cut F3_tool120
    add(f3_tool120_1.part, mode=Mode.SUBTRACT)

    # F4 (on Right) → F5 (cut)
    with BuildSketch(Plane.YZ):
        with Locations((33.9439660311, -9.892241098)):
            Circle(F4_R)
        with Locations((-48.2974201441, -9.698276408)):
            Circle(F4_R_2)
    extrude(amount=-F5_DEPTH, mode=Mode.SUBTRACT)

    # F6 (on Right) → F7 (cut)
    with BuildSketch(Plane.YZ):
        with Locations((32.780174166, -9.892241098)):
            Circle(F6_R)
        with Locations((-49.6551729739, -9.892241098)):
            Circle(F6_R_2)
    extrude(amount=F7_DEPTH, mode=Mode.SUBTRACT)


solid = f1_17.part
